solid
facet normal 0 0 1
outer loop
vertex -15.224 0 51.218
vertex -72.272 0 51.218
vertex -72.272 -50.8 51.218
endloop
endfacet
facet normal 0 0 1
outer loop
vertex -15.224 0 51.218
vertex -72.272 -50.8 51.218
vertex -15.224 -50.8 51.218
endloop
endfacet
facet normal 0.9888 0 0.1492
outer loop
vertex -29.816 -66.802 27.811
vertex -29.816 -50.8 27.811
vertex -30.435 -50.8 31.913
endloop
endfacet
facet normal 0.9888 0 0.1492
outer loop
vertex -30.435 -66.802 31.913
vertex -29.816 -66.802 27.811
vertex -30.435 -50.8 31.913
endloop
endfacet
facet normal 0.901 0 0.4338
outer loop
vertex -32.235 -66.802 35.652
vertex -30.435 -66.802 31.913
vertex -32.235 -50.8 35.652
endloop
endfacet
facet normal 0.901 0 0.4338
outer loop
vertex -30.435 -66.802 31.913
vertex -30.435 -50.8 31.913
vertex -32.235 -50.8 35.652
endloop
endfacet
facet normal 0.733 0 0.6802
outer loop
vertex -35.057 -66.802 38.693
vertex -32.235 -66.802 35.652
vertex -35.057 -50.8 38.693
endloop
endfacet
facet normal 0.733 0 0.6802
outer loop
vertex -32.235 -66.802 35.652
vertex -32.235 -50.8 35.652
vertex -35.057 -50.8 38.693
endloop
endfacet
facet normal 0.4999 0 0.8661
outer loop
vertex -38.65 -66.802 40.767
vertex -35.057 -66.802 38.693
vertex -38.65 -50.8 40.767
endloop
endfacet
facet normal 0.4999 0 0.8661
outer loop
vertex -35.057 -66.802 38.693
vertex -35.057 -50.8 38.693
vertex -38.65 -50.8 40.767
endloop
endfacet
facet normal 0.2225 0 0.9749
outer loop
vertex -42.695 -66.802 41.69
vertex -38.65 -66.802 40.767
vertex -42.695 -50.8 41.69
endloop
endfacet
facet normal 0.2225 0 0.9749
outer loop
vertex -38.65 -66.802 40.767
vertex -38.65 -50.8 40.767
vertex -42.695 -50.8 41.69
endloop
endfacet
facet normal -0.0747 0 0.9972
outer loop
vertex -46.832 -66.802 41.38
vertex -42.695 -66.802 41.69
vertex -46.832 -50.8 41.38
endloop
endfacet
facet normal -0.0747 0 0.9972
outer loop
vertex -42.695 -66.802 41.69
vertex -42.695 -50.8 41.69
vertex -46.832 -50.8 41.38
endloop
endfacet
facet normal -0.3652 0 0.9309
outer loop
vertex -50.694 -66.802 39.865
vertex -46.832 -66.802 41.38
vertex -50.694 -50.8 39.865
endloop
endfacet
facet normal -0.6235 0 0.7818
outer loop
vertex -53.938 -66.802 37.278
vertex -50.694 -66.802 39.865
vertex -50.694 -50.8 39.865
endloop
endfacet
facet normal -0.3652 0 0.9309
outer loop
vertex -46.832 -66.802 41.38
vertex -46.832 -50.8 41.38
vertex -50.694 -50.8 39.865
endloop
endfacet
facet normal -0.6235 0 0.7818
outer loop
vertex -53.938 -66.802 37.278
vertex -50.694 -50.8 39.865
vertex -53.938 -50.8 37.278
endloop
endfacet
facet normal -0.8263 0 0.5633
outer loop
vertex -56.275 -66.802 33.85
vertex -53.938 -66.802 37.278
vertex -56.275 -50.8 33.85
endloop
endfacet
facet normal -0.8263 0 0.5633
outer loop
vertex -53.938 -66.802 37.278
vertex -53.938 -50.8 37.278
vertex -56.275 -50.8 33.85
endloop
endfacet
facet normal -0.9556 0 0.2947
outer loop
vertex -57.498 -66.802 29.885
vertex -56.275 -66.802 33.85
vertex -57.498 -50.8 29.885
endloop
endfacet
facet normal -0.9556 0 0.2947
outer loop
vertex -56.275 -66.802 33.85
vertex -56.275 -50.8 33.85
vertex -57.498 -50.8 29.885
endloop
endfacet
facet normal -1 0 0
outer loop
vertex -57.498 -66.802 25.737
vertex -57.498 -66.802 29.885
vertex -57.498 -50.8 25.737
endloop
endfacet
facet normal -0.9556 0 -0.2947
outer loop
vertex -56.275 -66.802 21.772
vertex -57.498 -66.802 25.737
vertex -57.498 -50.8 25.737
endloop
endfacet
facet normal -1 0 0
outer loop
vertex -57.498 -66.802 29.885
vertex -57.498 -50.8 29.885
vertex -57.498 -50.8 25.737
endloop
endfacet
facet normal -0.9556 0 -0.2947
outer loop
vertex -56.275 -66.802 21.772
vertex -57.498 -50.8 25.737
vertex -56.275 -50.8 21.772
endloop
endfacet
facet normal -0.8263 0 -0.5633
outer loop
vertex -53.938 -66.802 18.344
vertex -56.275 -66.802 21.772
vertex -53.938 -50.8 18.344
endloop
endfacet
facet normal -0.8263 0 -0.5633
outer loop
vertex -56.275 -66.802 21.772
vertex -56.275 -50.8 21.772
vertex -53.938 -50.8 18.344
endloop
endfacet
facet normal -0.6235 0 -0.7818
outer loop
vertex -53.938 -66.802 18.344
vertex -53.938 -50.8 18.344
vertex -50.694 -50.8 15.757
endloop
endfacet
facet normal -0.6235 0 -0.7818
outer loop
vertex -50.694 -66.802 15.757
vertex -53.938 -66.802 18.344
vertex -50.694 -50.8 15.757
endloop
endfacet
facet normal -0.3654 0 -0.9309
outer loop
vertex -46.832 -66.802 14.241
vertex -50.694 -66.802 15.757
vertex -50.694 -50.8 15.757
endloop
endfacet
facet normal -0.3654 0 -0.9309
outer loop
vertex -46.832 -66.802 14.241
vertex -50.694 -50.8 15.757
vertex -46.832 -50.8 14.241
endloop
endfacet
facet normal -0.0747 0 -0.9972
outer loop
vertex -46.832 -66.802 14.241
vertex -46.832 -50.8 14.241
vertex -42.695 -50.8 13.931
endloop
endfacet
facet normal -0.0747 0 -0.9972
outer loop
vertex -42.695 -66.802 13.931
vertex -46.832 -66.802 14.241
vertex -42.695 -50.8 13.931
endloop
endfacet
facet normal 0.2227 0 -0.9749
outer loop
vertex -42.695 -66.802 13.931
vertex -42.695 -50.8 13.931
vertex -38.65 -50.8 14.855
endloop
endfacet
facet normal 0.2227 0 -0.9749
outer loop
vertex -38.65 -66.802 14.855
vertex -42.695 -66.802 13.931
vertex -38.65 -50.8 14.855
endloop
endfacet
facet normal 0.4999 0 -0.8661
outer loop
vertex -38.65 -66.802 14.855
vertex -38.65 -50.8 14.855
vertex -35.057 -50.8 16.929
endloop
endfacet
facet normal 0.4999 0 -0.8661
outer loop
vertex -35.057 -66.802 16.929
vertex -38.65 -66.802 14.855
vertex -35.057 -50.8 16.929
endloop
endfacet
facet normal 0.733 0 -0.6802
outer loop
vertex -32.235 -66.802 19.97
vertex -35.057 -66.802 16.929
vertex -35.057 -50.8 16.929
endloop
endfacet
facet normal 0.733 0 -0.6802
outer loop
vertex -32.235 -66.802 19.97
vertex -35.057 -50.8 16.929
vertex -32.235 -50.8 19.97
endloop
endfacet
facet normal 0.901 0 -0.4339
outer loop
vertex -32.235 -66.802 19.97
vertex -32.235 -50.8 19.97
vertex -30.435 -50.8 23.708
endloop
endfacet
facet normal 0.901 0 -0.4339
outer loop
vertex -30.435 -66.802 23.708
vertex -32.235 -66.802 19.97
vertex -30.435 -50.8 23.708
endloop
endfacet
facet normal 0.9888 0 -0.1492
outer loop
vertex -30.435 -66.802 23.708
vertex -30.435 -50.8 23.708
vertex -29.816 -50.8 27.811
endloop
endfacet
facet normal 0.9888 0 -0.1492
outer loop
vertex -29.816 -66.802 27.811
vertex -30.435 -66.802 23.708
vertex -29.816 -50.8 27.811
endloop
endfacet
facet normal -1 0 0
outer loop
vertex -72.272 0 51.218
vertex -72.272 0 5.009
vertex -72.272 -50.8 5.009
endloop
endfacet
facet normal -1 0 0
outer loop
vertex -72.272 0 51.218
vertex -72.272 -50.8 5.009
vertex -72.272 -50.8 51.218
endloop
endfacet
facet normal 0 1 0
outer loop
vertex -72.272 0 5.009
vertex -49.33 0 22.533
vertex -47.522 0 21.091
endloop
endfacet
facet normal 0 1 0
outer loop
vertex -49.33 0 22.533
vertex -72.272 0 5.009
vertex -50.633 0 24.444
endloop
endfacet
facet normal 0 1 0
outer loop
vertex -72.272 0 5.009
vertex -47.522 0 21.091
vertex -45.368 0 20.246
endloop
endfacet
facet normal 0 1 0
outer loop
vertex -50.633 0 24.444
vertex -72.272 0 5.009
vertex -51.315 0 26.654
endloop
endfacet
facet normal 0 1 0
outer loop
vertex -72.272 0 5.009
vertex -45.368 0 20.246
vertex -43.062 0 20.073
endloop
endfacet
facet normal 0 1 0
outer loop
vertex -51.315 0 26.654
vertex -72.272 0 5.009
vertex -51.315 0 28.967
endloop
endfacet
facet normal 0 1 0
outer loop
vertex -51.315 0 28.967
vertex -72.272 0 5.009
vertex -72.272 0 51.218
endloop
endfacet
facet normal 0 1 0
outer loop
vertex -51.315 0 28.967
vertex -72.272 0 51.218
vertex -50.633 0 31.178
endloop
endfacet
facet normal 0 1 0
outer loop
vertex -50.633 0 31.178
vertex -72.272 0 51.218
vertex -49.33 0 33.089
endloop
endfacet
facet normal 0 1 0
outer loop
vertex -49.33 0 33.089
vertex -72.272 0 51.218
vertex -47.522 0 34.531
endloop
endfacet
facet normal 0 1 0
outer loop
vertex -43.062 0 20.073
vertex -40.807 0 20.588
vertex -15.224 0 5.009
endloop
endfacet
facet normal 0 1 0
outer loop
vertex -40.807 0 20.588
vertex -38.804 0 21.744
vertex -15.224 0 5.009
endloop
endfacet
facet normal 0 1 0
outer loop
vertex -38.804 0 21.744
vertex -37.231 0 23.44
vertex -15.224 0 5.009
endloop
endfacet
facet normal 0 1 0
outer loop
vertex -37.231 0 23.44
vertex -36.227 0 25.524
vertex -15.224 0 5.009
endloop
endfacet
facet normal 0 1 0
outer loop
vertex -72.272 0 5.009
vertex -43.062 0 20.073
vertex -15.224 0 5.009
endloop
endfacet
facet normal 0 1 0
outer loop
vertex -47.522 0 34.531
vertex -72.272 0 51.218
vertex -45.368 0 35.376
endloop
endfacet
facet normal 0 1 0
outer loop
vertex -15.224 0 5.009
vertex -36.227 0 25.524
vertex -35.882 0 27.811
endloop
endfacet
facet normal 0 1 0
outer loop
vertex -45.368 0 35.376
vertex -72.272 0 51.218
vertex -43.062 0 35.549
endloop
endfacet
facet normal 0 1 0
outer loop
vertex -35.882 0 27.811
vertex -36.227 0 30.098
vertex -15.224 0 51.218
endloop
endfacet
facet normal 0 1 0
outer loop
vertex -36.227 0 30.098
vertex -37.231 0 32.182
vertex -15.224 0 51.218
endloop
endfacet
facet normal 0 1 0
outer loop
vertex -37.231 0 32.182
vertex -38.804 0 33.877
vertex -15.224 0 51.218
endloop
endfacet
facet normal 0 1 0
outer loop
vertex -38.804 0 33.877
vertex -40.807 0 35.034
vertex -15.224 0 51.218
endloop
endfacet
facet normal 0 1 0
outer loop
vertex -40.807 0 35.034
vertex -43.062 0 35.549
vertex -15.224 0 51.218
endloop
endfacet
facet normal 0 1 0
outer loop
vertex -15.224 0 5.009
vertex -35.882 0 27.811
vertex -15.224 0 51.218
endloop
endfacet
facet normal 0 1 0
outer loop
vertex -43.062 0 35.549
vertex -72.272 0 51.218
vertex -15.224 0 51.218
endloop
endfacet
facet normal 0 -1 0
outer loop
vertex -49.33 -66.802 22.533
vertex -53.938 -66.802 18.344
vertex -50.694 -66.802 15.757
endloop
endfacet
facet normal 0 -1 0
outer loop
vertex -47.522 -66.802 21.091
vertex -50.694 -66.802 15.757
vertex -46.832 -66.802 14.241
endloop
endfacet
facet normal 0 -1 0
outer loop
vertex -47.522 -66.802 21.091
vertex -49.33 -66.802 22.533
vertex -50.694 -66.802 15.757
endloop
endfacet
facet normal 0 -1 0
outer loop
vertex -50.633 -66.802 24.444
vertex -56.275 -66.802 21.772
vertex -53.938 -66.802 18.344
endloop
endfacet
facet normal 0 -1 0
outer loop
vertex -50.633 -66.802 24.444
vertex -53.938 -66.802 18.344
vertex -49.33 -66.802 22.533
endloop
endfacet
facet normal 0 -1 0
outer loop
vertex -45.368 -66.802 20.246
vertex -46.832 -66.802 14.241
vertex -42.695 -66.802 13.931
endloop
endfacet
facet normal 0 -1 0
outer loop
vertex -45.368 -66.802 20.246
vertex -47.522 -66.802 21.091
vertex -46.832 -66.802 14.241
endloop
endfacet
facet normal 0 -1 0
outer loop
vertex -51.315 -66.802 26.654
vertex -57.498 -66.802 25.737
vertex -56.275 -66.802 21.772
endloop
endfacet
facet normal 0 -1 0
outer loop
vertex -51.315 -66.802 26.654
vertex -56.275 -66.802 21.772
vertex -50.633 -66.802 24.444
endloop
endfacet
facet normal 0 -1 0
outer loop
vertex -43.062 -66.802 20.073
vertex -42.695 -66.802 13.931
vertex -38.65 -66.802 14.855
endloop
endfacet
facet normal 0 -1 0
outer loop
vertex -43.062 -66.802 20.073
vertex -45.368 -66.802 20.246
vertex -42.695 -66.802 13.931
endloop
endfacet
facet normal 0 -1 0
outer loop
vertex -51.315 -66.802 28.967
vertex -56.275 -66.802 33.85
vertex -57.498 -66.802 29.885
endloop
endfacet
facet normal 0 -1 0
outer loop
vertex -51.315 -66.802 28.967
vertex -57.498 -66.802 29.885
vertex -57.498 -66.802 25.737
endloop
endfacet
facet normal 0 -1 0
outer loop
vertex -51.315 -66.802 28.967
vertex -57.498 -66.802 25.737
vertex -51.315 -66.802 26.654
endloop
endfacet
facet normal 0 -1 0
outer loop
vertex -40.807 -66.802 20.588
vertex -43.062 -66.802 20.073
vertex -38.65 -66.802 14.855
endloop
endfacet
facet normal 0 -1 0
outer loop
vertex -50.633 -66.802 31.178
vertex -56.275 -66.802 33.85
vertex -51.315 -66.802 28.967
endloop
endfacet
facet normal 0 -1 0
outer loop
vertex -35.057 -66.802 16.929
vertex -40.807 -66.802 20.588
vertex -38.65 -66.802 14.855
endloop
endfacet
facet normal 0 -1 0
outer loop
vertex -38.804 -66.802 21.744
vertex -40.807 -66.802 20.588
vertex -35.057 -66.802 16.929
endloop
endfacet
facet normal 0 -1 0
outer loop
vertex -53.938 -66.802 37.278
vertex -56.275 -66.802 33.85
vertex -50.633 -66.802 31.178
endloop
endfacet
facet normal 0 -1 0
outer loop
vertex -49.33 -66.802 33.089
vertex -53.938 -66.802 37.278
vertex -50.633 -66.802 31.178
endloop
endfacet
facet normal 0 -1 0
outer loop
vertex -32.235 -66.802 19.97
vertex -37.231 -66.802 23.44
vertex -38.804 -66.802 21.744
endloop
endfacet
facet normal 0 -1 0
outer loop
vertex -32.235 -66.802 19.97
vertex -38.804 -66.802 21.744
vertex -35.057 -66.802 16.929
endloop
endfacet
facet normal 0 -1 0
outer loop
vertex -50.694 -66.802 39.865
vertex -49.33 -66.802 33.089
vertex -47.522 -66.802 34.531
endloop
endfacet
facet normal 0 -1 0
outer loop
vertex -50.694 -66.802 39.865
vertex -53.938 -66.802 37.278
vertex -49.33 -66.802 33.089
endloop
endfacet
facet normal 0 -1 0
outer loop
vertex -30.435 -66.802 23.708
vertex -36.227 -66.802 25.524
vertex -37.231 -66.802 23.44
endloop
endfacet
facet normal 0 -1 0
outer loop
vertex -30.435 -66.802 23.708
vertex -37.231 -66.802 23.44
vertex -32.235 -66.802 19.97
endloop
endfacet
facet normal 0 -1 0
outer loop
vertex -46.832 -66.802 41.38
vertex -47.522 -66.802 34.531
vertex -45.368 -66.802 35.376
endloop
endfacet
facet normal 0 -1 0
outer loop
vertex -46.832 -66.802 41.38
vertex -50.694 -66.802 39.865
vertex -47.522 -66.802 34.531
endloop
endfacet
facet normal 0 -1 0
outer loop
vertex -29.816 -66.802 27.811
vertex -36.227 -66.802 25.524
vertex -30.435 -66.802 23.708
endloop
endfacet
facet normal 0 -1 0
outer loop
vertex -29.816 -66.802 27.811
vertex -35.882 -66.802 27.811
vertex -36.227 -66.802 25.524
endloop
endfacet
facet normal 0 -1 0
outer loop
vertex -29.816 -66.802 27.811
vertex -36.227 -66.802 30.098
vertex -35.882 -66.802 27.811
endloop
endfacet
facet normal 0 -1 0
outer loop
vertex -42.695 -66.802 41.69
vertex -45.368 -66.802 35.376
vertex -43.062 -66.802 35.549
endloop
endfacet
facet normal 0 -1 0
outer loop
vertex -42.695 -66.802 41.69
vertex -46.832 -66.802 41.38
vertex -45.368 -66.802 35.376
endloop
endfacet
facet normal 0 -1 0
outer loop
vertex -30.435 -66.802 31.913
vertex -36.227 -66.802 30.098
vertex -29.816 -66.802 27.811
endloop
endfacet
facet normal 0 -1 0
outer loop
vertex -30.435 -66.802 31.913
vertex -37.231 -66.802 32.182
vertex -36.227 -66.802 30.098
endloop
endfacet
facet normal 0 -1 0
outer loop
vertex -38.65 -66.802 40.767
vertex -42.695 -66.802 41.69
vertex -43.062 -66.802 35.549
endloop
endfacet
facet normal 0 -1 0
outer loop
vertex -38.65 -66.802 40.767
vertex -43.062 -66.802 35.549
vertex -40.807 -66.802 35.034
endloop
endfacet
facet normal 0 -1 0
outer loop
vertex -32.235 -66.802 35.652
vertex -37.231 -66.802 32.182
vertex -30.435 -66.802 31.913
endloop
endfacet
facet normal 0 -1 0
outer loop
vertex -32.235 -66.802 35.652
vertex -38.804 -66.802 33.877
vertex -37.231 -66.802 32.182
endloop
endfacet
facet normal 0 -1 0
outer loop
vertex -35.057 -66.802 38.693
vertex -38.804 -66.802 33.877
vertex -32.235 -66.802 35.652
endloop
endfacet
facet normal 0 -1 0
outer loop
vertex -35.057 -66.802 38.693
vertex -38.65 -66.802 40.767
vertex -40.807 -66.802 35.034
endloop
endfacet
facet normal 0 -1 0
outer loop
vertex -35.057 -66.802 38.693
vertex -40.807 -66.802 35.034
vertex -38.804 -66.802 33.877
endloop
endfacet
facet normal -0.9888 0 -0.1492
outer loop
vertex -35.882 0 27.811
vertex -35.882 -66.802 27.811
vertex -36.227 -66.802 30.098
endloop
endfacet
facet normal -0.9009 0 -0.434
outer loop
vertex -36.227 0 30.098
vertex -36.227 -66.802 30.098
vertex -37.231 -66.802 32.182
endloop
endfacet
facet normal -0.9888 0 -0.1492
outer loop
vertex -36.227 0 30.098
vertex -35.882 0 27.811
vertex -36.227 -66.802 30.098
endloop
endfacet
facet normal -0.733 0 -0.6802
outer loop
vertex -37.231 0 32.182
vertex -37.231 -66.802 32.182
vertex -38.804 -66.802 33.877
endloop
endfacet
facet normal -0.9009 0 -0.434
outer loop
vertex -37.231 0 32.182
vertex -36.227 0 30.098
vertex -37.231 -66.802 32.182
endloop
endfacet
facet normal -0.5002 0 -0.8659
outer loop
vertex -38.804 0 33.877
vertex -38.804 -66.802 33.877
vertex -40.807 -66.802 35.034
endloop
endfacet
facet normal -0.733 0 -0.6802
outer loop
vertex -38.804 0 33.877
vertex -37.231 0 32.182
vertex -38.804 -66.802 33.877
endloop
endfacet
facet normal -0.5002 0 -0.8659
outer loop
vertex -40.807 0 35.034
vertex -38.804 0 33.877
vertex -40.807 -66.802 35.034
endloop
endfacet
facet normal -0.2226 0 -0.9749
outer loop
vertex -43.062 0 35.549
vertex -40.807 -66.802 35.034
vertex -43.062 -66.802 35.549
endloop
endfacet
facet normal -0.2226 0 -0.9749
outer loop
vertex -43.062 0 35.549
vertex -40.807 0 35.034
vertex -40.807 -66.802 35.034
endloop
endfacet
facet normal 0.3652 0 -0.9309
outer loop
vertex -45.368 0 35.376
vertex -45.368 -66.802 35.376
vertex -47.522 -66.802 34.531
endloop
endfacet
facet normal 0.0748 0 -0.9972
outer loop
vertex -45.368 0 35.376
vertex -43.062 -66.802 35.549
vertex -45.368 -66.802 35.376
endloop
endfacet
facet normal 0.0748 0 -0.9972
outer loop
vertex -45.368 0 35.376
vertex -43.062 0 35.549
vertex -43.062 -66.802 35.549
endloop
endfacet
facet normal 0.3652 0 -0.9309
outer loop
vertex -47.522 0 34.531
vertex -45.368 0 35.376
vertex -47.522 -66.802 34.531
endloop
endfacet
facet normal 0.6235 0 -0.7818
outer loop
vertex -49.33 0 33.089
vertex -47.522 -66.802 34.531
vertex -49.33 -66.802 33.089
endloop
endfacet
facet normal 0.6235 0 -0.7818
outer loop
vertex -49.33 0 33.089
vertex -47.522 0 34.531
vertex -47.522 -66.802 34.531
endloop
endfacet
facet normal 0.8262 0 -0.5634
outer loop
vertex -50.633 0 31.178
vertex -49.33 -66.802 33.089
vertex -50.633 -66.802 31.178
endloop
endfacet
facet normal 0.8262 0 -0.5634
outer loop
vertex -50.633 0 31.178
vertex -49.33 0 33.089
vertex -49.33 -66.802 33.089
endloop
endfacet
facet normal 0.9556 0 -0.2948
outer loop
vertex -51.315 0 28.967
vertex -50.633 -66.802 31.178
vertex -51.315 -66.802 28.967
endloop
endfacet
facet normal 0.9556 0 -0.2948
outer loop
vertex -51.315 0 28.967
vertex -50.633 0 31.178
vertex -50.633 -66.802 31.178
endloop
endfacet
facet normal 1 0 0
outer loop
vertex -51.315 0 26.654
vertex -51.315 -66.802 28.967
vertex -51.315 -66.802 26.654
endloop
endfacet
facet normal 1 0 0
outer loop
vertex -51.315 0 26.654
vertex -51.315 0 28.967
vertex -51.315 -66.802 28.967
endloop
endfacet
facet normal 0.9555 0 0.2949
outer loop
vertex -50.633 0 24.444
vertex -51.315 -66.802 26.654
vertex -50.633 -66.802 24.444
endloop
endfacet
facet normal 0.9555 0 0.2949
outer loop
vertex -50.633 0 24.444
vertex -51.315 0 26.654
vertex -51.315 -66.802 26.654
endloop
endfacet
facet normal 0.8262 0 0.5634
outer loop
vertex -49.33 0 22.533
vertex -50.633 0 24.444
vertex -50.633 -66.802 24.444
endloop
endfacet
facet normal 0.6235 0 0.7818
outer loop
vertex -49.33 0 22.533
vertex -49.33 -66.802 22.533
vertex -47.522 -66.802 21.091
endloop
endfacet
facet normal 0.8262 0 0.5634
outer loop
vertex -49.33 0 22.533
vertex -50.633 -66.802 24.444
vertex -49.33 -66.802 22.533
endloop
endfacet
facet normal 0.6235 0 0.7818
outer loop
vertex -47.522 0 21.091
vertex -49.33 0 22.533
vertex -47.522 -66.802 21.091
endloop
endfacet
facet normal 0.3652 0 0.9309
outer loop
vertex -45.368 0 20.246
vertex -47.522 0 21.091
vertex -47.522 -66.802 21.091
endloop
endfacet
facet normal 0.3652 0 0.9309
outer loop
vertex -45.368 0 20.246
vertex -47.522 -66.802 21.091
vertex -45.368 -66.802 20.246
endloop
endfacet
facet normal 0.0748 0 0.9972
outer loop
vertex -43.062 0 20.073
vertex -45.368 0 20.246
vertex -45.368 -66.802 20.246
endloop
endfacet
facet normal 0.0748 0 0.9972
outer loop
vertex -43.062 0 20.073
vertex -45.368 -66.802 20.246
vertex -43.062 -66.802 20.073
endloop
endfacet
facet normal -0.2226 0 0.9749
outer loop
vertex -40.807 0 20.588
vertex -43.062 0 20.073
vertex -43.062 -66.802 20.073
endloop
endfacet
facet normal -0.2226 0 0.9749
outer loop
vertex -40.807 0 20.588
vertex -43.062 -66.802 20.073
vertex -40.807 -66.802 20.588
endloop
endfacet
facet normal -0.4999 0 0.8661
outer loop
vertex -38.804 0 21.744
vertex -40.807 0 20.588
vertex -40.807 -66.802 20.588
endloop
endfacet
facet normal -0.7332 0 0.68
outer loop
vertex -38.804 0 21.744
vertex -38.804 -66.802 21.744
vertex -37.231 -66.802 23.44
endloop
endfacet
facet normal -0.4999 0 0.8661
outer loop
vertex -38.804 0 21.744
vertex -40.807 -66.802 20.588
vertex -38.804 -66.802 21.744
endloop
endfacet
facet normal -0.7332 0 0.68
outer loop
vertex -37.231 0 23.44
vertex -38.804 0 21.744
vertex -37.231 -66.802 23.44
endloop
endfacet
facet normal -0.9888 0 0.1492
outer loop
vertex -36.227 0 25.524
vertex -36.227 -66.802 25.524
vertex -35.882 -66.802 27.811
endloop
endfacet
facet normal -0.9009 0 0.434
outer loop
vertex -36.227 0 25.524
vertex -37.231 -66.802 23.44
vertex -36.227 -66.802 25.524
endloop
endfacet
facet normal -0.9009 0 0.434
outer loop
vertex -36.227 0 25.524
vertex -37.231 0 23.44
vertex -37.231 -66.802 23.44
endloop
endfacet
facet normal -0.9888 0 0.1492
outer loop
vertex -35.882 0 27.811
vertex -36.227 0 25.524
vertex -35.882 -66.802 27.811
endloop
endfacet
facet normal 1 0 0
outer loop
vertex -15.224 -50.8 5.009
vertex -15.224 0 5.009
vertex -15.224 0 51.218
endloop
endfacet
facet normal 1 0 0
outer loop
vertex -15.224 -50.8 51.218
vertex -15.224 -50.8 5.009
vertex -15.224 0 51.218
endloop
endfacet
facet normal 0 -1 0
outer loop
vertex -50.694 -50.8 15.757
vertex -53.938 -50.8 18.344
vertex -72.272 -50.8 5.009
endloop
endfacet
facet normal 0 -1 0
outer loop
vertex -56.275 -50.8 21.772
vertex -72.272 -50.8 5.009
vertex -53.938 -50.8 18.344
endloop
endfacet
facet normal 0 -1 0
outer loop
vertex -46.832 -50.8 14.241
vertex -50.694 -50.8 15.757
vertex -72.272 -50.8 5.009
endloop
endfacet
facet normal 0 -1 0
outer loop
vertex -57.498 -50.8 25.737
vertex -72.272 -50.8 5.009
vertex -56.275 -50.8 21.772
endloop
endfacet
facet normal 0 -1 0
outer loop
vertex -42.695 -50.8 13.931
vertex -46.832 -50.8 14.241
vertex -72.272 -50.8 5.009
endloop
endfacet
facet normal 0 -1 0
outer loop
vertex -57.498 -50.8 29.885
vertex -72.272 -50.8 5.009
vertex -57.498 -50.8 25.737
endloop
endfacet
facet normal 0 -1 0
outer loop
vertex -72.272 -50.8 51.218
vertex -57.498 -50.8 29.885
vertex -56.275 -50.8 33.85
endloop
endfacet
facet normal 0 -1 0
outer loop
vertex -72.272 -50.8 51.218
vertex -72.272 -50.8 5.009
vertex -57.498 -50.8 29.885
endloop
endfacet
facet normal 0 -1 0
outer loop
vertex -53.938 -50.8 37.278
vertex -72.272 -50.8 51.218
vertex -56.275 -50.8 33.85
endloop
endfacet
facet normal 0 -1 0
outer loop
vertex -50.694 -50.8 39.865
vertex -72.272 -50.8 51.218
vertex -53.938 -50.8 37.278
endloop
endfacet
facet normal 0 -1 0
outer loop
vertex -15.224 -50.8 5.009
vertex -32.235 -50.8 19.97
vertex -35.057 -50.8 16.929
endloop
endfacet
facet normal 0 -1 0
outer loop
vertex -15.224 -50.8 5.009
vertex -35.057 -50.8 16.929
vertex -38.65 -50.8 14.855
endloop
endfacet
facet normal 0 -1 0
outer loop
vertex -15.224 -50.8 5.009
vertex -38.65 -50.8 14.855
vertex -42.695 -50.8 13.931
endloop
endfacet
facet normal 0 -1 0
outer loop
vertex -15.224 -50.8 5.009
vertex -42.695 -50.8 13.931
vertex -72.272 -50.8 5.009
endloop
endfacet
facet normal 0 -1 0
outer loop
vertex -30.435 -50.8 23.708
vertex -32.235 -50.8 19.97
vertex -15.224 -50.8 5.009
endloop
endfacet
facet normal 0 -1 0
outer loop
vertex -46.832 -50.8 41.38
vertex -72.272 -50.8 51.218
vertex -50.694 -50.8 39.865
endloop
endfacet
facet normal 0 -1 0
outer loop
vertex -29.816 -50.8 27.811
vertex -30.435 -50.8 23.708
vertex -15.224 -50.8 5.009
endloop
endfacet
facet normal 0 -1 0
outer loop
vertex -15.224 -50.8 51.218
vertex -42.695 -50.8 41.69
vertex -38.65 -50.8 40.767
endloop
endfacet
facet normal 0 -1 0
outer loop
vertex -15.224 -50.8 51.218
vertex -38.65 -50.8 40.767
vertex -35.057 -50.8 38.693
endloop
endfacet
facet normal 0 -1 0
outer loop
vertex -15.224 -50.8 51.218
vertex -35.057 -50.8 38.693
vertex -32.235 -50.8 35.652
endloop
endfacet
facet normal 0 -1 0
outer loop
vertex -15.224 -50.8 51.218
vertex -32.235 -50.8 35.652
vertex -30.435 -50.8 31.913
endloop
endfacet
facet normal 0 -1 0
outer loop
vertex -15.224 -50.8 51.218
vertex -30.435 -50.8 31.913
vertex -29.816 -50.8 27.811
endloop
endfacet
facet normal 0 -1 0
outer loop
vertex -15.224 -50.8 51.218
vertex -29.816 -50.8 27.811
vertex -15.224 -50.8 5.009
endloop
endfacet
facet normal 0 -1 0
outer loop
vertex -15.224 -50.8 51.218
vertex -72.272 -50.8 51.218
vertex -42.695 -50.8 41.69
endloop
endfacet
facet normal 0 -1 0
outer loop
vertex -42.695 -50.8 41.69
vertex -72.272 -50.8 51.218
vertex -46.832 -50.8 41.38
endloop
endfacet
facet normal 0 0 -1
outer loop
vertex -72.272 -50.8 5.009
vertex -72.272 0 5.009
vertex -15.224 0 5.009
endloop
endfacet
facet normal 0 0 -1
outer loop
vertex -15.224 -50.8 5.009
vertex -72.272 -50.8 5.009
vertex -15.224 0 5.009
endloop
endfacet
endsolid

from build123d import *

# Parameters (mm, degrees)
F0_W     = 57.048134
F0_H     = 46.208985
F1_DEPTH = 50.8
F2_R     = 13.918447
F3_DEPTH = 66.802
F4_R     = 7.759386
F5_DEPTH = 66.803


with BuildPart() as f1:
    # F0 (on Front) → F1 (new body)
    with BuildSketch(Plane.XZ):
        with Locations((-43.748088, 28.113147)):
            Rectangle(F0_W, F0_H)
    extrude(amount=F1_DEPTH)

    # F2 (on Front) → F3 (join)
    with BuildSketch(Plane.XZ):
        with Locations((-43.734889, 27.810963)):
            Circle(F2_R)
    extrude(amount=F3_DEPTH)

    # F4 (on Front) → F5 (cut, through all)
    with BuildSketch(Plane.XZ):
        with Locations((-43.641817, 27.810963)):
            Circle(F4_R)
    extrude(amount=F5_DEPTH, mode=Mode.SUBTRACT)


solid = f1.part
